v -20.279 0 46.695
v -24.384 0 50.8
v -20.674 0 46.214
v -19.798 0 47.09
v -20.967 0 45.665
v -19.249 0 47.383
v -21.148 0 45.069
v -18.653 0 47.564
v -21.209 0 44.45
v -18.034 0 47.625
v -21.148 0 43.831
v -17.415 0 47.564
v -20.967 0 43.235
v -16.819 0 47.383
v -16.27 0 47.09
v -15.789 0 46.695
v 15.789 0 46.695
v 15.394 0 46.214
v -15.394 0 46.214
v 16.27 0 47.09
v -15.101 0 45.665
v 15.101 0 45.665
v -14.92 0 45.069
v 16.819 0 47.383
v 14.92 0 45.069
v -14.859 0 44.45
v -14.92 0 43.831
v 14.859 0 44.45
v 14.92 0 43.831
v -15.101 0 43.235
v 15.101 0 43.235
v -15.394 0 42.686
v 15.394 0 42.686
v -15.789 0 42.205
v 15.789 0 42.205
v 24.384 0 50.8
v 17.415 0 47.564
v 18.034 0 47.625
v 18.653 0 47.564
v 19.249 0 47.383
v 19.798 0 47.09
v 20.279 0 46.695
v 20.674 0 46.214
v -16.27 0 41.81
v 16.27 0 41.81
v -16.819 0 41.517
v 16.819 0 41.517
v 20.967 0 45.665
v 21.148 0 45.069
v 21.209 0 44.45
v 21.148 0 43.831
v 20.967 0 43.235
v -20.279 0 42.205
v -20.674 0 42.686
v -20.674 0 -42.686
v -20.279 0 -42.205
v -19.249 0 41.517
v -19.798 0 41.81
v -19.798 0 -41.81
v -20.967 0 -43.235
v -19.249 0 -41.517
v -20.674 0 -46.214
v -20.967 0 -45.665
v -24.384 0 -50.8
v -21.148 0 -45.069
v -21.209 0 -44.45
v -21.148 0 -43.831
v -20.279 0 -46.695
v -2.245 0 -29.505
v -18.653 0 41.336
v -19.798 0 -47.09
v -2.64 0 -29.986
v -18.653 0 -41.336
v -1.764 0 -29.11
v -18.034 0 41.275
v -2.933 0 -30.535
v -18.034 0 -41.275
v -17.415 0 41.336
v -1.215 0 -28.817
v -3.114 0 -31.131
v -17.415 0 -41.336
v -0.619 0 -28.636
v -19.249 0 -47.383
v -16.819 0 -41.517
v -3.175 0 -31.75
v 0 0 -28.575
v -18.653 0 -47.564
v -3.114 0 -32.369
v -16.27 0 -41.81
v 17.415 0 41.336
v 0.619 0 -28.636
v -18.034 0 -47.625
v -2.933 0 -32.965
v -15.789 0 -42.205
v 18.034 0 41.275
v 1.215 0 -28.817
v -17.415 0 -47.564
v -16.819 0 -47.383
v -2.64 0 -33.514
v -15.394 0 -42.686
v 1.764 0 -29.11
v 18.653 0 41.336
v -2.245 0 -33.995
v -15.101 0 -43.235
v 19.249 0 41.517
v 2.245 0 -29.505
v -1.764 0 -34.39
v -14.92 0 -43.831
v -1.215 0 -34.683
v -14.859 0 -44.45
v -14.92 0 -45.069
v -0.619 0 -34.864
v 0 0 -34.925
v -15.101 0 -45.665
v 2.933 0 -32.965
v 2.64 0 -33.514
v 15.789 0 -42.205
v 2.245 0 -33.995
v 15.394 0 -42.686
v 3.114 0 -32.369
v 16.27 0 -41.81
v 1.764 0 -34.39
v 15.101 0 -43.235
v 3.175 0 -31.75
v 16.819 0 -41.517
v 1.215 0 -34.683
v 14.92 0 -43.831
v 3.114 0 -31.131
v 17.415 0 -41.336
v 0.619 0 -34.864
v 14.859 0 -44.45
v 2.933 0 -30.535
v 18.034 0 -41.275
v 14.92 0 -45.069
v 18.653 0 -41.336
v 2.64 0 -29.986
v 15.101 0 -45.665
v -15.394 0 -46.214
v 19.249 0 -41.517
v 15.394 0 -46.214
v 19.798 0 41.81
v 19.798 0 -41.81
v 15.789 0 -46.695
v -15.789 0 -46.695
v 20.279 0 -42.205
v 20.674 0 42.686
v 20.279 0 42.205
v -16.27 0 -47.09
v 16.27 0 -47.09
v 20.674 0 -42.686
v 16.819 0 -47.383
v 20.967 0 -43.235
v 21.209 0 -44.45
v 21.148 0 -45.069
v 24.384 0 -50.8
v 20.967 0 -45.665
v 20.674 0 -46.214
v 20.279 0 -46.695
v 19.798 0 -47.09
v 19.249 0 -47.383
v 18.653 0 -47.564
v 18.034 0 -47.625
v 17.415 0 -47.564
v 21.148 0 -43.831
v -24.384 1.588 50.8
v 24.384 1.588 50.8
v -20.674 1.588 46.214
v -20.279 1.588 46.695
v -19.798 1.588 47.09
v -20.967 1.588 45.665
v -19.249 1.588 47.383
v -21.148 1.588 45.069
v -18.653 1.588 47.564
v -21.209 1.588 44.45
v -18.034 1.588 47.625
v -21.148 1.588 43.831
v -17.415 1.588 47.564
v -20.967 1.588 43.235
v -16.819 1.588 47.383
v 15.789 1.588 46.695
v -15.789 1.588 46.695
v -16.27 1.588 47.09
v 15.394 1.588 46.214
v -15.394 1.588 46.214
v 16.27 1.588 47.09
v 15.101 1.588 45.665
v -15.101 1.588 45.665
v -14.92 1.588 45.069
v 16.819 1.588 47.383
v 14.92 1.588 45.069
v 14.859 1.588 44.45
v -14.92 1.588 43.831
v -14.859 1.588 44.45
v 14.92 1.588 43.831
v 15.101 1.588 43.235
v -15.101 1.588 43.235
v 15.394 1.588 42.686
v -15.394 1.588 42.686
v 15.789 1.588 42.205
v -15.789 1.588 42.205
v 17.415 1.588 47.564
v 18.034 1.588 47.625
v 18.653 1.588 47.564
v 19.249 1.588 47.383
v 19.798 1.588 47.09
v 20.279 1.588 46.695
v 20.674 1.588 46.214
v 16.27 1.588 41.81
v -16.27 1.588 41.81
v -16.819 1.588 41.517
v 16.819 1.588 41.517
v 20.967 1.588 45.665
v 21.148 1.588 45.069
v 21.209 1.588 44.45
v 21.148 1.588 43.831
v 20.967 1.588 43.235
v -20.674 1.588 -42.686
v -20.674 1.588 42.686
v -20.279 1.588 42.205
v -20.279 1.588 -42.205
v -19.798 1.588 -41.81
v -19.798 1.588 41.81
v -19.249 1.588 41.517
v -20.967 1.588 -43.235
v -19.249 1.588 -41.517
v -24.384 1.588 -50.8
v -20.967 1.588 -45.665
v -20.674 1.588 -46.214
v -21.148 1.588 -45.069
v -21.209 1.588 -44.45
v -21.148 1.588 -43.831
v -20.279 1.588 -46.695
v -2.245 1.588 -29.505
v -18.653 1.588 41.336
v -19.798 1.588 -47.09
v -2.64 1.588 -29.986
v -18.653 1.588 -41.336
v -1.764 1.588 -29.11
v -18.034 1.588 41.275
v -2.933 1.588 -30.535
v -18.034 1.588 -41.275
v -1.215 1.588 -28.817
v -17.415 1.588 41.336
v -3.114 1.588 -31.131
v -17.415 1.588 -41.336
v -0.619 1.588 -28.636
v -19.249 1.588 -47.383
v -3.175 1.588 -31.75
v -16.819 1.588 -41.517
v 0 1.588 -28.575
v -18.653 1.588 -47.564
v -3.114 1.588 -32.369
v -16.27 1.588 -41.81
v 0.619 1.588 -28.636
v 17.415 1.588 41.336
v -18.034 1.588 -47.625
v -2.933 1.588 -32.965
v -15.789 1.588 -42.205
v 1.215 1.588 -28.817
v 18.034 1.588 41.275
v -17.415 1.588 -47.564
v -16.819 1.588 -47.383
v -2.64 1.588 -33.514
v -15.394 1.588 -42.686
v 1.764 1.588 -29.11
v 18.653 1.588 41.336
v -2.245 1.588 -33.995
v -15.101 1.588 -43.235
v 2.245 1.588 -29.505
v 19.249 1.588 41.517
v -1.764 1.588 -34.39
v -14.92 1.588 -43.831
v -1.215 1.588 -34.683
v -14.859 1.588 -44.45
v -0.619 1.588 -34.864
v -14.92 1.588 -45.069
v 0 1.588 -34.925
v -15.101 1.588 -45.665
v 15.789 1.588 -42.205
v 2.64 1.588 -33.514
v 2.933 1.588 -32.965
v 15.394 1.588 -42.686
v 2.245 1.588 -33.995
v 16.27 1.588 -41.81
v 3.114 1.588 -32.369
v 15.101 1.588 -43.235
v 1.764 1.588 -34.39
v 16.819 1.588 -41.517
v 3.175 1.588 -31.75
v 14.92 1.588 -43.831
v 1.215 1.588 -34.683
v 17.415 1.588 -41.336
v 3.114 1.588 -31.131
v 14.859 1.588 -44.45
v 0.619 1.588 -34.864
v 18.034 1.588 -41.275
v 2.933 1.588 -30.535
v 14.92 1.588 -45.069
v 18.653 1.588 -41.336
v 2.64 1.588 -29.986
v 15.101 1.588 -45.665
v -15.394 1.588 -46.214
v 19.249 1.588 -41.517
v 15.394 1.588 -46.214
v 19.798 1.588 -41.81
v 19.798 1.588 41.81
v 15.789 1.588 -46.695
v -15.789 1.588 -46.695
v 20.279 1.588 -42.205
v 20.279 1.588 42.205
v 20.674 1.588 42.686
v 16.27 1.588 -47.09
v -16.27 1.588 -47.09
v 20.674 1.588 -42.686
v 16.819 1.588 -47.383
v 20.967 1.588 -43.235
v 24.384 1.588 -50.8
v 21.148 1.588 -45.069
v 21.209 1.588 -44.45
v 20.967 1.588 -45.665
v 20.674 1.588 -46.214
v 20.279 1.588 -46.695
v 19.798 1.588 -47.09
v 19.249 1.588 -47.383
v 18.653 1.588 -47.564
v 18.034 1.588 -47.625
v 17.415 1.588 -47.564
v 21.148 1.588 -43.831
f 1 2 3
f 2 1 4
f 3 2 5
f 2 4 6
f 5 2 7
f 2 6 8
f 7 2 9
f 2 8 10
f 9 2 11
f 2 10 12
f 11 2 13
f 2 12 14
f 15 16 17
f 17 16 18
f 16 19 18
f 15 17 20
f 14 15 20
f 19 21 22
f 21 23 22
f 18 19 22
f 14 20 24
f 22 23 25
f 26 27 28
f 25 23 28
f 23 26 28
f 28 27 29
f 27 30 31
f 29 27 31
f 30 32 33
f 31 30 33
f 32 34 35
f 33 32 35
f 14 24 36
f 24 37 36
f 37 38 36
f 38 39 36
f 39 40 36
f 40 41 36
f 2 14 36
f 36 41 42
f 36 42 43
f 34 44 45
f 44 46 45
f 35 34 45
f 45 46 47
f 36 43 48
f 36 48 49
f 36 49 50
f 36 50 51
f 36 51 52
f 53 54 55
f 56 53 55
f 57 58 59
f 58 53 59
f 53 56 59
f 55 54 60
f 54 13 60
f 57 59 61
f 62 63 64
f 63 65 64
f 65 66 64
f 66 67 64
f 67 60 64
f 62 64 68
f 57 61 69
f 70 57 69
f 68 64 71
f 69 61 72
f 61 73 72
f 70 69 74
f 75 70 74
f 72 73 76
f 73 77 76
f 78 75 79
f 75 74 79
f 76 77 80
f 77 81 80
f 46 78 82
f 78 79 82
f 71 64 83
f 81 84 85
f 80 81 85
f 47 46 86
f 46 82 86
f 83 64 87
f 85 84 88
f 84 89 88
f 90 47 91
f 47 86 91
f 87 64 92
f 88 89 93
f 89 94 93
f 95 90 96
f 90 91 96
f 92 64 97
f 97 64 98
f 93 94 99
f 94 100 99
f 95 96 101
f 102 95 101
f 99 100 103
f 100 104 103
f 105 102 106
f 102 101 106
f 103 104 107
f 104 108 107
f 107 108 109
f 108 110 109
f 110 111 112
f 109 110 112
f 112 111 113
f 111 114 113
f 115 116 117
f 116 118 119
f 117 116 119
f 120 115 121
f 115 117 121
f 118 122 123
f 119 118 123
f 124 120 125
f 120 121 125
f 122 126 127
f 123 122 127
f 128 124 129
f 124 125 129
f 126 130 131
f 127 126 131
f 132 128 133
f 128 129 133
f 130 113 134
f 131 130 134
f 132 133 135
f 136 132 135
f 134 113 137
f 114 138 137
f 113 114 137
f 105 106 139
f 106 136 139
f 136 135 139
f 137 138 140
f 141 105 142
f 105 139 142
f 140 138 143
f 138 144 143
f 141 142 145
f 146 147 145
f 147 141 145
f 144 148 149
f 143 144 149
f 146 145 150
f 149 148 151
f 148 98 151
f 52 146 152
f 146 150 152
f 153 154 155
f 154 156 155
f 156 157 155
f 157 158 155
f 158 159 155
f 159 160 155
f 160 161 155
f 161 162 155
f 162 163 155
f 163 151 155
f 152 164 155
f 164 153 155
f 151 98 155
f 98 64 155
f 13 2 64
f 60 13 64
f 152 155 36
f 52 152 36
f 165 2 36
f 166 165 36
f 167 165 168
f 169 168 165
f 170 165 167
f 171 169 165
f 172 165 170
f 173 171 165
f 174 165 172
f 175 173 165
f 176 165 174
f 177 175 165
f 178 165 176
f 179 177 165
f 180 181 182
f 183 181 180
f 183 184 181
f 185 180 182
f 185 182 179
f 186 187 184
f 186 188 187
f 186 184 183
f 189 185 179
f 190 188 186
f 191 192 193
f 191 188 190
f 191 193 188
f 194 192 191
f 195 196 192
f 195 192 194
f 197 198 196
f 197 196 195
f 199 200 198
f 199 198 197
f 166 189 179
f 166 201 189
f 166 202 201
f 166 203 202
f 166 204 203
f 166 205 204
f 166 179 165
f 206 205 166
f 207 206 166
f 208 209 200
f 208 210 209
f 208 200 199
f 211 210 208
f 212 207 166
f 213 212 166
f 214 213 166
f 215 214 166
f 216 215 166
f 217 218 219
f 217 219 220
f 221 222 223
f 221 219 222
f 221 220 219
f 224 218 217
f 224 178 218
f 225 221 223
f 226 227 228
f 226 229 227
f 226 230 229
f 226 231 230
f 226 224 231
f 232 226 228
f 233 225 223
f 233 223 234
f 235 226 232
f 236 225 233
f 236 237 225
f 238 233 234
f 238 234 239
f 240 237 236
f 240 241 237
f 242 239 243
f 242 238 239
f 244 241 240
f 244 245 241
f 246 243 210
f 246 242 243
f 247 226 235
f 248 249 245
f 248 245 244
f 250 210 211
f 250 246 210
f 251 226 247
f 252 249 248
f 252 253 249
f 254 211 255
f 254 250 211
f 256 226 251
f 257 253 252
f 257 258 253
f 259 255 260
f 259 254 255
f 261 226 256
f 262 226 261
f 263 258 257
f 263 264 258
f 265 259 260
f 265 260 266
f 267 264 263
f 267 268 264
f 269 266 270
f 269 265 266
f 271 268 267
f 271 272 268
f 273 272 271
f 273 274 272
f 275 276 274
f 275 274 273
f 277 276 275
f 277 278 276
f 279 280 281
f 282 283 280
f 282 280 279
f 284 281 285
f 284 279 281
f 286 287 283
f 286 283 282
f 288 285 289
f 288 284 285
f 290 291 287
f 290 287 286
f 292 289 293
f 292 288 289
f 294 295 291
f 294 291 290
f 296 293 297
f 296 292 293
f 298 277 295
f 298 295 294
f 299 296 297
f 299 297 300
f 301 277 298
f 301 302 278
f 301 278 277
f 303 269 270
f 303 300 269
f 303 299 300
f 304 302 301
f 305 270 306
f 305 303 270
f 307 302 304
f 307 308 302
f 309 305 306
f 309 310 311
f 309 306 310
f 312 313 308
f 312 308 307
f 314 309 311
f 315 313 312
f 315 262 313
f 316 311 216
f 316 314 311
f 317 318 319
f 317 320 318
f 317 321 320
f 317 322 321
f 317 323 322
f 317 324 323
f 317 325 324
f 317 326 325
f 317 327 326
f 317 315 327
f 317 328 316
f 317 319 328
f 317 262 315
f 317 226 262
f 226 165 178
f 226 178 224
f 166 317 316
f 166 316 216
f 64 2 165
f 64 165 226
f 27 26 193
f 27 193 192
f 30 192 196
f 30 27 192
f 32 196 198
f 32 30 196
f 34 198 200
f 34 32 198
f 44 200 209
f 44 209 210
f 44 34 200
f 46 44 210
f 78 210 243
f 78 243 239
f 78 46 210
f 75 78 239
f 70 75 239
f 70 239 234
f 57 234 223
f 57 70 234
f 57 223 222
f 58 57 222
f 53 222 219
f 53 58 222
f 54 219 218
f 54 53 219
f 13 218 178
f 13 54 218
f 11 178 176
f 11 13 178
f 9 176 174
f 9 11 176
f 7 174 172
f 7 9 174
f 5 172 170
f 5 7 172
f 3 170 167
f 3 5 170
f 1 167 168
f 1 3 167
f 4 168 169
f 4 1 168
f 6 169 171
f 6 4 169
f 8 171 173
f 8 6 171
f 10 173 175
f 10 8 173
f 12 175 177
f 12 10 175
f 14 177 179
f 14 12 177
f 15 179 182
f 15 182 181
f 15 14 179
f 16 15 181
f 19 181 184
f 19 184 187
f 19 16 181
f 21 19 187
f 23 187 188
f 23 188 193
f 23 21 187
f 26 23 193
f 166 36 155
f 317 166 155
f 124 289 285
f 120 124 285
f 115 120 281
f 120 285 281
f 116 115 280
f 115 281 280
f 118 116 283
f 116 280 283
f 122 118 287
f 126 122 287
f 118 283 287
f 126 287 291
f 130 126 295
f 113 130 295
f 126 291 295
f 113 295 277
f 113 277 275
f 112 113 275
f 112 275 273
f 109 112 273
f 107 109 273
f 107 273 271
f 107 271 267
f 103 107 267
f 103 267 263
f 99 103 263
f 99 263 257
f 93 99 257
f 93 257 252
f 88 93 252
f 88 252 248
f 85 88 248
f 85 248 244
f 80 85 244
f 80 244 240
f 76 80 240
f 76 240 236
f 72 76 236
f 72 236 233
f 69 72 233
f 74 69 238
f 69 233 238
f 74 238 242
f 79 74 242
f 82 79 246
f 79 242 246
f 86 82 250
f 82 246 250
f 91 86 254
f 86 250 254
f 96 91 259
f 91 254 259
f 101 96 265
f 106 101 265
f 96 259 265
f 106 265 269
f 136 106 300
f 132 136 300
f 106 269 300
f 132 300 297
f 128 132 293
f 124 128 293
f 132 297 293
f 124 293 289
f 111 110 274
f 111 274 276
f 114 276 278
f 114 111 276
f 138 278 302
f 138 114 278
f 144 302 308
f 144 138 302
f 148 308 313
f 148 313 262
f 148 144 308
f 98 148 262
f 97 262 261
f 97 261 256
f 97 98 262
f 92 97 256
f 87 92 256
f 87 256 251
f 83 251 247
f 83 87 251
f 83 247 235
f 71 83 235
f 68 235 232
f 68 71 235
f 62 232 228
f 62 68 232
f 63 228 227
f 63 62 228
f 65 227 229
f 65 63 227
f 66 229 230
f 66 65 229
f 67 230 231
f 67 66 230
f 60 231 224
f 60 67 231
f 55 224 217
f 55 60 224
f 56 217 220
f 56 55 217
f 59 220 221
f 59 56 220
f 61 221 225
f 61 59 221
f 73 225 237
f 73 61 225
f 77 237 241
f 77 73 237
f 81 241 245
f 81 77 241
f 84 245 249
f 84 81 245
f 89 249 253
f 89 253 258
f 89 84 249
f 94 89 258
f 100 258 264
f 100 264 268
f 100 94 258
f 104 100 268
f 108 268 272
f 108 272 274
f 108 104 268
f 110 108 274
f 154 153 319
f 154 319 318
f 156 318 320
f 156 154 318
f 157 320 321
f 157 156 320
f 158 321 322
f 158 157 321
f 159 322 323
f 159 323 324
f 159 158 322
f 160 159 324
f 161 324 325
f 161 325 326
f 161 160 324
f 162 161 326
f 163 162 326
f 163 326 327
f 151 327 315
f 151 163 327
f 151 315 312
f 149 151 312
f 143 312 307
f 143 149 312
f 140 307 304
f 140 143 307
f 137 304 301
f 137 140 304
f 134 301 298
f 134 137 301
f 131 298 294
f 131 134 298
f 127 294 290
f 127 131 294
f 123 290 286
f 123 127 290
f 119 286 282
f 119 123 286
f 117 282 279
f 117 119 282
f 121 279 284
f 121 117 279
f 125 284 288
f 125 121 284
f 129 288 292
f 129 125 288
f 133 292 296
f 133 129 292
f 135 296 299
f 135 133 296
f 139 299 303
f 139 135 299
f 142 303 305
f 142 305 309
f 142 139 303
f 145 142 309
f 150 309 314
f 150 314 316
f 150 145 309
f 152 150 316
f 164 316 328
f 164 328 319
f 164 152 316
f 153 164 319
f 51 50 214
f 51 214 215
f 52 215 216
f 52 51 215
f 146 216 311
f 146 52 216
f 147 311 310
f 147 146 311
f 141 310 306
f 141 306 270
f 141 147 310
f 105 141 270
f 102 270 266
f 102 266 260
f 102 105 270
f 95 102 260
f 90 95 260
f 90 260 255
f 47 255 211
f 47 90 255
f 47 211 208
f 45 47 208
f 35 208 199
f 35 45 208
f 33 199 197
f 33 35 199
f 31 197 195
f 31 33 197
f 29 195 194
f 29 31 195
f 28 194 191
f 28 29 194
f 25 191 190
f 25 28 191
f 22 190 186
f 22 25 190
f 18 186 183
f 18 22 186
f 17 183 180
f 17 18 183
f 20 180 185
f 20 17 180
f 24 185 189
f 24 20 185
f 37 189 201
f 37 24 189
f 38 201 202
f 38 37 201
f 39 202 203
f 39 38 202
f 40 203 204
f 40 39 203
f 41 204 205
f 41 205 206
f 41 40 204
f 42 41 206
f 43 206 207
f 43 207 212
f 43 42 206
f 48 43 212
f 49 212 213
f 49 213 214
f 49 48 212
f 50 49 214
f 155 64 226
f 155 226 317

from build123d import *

# Parameters (mm, degrees)
SKETCH1_W           = 48.768
SKETCH1_H           = 101.6
SKETCH1_R           = 3.175
BOSS_EXTRUDE1_DEPTH = 1.5875
CUT_EXTRUDE1_REACH  = 3.587
SKETCH2_R           = 3.175


with BuildPart() as part:
    # Sketch1 → Boss-Extrude1 (new body)
    with BuildSketch(Plane(origin=(0, 0, 0), x_dir=(1, 0, 0), z_dir=(0, 1, 0))):
        Rectangle(SKETCH1_W, SKETCH1_H)
        with Locations((-18.034, 44.45)):
            Circle(SKETCH1_R, mode=Mode.SUBTRACT)
        with Locations((18.034, 44.45)):
            Circle(SKETCH1_R, mode=Mode.SUBTRACT)
        with Locations((18.034, -44.45)):
            Circle(SKETCH1_R, mode=Mode.SUBTRACT)
        with Locations((-18.034, -44.45)):
            Circle(SKETCH1_R, mode=Mode.SUBTRACT)
    extrude(amount=BOSS_EXTRUDE1_DEPTH)

    # Sketch2 → Cut-Extrude1 (cut, up to next)
    with BuildSketch(Plane(origin=(0, 1.5875, 0), x_dir=(1, 0, 0), z_dir=(0, 1, 0)), mode=Mode.PRIVATE) as cut_extrude1_sk1:
        with Locations((0, 31.75)):
            Circle(SKETCH2_R)
    cut_extrude1_tool1 = extrude(cut_extrude1_sk1.sketch, amount=-CUT_EXTRUDE1_REACH, mode=Mode.PRIVATE) & part.part
    add(cut_extrude1_tool1.solids().sort_by_distance((0, 1.5875, -31.75))[0], mode=Mode.SUBTRACT)


solid = part.part
